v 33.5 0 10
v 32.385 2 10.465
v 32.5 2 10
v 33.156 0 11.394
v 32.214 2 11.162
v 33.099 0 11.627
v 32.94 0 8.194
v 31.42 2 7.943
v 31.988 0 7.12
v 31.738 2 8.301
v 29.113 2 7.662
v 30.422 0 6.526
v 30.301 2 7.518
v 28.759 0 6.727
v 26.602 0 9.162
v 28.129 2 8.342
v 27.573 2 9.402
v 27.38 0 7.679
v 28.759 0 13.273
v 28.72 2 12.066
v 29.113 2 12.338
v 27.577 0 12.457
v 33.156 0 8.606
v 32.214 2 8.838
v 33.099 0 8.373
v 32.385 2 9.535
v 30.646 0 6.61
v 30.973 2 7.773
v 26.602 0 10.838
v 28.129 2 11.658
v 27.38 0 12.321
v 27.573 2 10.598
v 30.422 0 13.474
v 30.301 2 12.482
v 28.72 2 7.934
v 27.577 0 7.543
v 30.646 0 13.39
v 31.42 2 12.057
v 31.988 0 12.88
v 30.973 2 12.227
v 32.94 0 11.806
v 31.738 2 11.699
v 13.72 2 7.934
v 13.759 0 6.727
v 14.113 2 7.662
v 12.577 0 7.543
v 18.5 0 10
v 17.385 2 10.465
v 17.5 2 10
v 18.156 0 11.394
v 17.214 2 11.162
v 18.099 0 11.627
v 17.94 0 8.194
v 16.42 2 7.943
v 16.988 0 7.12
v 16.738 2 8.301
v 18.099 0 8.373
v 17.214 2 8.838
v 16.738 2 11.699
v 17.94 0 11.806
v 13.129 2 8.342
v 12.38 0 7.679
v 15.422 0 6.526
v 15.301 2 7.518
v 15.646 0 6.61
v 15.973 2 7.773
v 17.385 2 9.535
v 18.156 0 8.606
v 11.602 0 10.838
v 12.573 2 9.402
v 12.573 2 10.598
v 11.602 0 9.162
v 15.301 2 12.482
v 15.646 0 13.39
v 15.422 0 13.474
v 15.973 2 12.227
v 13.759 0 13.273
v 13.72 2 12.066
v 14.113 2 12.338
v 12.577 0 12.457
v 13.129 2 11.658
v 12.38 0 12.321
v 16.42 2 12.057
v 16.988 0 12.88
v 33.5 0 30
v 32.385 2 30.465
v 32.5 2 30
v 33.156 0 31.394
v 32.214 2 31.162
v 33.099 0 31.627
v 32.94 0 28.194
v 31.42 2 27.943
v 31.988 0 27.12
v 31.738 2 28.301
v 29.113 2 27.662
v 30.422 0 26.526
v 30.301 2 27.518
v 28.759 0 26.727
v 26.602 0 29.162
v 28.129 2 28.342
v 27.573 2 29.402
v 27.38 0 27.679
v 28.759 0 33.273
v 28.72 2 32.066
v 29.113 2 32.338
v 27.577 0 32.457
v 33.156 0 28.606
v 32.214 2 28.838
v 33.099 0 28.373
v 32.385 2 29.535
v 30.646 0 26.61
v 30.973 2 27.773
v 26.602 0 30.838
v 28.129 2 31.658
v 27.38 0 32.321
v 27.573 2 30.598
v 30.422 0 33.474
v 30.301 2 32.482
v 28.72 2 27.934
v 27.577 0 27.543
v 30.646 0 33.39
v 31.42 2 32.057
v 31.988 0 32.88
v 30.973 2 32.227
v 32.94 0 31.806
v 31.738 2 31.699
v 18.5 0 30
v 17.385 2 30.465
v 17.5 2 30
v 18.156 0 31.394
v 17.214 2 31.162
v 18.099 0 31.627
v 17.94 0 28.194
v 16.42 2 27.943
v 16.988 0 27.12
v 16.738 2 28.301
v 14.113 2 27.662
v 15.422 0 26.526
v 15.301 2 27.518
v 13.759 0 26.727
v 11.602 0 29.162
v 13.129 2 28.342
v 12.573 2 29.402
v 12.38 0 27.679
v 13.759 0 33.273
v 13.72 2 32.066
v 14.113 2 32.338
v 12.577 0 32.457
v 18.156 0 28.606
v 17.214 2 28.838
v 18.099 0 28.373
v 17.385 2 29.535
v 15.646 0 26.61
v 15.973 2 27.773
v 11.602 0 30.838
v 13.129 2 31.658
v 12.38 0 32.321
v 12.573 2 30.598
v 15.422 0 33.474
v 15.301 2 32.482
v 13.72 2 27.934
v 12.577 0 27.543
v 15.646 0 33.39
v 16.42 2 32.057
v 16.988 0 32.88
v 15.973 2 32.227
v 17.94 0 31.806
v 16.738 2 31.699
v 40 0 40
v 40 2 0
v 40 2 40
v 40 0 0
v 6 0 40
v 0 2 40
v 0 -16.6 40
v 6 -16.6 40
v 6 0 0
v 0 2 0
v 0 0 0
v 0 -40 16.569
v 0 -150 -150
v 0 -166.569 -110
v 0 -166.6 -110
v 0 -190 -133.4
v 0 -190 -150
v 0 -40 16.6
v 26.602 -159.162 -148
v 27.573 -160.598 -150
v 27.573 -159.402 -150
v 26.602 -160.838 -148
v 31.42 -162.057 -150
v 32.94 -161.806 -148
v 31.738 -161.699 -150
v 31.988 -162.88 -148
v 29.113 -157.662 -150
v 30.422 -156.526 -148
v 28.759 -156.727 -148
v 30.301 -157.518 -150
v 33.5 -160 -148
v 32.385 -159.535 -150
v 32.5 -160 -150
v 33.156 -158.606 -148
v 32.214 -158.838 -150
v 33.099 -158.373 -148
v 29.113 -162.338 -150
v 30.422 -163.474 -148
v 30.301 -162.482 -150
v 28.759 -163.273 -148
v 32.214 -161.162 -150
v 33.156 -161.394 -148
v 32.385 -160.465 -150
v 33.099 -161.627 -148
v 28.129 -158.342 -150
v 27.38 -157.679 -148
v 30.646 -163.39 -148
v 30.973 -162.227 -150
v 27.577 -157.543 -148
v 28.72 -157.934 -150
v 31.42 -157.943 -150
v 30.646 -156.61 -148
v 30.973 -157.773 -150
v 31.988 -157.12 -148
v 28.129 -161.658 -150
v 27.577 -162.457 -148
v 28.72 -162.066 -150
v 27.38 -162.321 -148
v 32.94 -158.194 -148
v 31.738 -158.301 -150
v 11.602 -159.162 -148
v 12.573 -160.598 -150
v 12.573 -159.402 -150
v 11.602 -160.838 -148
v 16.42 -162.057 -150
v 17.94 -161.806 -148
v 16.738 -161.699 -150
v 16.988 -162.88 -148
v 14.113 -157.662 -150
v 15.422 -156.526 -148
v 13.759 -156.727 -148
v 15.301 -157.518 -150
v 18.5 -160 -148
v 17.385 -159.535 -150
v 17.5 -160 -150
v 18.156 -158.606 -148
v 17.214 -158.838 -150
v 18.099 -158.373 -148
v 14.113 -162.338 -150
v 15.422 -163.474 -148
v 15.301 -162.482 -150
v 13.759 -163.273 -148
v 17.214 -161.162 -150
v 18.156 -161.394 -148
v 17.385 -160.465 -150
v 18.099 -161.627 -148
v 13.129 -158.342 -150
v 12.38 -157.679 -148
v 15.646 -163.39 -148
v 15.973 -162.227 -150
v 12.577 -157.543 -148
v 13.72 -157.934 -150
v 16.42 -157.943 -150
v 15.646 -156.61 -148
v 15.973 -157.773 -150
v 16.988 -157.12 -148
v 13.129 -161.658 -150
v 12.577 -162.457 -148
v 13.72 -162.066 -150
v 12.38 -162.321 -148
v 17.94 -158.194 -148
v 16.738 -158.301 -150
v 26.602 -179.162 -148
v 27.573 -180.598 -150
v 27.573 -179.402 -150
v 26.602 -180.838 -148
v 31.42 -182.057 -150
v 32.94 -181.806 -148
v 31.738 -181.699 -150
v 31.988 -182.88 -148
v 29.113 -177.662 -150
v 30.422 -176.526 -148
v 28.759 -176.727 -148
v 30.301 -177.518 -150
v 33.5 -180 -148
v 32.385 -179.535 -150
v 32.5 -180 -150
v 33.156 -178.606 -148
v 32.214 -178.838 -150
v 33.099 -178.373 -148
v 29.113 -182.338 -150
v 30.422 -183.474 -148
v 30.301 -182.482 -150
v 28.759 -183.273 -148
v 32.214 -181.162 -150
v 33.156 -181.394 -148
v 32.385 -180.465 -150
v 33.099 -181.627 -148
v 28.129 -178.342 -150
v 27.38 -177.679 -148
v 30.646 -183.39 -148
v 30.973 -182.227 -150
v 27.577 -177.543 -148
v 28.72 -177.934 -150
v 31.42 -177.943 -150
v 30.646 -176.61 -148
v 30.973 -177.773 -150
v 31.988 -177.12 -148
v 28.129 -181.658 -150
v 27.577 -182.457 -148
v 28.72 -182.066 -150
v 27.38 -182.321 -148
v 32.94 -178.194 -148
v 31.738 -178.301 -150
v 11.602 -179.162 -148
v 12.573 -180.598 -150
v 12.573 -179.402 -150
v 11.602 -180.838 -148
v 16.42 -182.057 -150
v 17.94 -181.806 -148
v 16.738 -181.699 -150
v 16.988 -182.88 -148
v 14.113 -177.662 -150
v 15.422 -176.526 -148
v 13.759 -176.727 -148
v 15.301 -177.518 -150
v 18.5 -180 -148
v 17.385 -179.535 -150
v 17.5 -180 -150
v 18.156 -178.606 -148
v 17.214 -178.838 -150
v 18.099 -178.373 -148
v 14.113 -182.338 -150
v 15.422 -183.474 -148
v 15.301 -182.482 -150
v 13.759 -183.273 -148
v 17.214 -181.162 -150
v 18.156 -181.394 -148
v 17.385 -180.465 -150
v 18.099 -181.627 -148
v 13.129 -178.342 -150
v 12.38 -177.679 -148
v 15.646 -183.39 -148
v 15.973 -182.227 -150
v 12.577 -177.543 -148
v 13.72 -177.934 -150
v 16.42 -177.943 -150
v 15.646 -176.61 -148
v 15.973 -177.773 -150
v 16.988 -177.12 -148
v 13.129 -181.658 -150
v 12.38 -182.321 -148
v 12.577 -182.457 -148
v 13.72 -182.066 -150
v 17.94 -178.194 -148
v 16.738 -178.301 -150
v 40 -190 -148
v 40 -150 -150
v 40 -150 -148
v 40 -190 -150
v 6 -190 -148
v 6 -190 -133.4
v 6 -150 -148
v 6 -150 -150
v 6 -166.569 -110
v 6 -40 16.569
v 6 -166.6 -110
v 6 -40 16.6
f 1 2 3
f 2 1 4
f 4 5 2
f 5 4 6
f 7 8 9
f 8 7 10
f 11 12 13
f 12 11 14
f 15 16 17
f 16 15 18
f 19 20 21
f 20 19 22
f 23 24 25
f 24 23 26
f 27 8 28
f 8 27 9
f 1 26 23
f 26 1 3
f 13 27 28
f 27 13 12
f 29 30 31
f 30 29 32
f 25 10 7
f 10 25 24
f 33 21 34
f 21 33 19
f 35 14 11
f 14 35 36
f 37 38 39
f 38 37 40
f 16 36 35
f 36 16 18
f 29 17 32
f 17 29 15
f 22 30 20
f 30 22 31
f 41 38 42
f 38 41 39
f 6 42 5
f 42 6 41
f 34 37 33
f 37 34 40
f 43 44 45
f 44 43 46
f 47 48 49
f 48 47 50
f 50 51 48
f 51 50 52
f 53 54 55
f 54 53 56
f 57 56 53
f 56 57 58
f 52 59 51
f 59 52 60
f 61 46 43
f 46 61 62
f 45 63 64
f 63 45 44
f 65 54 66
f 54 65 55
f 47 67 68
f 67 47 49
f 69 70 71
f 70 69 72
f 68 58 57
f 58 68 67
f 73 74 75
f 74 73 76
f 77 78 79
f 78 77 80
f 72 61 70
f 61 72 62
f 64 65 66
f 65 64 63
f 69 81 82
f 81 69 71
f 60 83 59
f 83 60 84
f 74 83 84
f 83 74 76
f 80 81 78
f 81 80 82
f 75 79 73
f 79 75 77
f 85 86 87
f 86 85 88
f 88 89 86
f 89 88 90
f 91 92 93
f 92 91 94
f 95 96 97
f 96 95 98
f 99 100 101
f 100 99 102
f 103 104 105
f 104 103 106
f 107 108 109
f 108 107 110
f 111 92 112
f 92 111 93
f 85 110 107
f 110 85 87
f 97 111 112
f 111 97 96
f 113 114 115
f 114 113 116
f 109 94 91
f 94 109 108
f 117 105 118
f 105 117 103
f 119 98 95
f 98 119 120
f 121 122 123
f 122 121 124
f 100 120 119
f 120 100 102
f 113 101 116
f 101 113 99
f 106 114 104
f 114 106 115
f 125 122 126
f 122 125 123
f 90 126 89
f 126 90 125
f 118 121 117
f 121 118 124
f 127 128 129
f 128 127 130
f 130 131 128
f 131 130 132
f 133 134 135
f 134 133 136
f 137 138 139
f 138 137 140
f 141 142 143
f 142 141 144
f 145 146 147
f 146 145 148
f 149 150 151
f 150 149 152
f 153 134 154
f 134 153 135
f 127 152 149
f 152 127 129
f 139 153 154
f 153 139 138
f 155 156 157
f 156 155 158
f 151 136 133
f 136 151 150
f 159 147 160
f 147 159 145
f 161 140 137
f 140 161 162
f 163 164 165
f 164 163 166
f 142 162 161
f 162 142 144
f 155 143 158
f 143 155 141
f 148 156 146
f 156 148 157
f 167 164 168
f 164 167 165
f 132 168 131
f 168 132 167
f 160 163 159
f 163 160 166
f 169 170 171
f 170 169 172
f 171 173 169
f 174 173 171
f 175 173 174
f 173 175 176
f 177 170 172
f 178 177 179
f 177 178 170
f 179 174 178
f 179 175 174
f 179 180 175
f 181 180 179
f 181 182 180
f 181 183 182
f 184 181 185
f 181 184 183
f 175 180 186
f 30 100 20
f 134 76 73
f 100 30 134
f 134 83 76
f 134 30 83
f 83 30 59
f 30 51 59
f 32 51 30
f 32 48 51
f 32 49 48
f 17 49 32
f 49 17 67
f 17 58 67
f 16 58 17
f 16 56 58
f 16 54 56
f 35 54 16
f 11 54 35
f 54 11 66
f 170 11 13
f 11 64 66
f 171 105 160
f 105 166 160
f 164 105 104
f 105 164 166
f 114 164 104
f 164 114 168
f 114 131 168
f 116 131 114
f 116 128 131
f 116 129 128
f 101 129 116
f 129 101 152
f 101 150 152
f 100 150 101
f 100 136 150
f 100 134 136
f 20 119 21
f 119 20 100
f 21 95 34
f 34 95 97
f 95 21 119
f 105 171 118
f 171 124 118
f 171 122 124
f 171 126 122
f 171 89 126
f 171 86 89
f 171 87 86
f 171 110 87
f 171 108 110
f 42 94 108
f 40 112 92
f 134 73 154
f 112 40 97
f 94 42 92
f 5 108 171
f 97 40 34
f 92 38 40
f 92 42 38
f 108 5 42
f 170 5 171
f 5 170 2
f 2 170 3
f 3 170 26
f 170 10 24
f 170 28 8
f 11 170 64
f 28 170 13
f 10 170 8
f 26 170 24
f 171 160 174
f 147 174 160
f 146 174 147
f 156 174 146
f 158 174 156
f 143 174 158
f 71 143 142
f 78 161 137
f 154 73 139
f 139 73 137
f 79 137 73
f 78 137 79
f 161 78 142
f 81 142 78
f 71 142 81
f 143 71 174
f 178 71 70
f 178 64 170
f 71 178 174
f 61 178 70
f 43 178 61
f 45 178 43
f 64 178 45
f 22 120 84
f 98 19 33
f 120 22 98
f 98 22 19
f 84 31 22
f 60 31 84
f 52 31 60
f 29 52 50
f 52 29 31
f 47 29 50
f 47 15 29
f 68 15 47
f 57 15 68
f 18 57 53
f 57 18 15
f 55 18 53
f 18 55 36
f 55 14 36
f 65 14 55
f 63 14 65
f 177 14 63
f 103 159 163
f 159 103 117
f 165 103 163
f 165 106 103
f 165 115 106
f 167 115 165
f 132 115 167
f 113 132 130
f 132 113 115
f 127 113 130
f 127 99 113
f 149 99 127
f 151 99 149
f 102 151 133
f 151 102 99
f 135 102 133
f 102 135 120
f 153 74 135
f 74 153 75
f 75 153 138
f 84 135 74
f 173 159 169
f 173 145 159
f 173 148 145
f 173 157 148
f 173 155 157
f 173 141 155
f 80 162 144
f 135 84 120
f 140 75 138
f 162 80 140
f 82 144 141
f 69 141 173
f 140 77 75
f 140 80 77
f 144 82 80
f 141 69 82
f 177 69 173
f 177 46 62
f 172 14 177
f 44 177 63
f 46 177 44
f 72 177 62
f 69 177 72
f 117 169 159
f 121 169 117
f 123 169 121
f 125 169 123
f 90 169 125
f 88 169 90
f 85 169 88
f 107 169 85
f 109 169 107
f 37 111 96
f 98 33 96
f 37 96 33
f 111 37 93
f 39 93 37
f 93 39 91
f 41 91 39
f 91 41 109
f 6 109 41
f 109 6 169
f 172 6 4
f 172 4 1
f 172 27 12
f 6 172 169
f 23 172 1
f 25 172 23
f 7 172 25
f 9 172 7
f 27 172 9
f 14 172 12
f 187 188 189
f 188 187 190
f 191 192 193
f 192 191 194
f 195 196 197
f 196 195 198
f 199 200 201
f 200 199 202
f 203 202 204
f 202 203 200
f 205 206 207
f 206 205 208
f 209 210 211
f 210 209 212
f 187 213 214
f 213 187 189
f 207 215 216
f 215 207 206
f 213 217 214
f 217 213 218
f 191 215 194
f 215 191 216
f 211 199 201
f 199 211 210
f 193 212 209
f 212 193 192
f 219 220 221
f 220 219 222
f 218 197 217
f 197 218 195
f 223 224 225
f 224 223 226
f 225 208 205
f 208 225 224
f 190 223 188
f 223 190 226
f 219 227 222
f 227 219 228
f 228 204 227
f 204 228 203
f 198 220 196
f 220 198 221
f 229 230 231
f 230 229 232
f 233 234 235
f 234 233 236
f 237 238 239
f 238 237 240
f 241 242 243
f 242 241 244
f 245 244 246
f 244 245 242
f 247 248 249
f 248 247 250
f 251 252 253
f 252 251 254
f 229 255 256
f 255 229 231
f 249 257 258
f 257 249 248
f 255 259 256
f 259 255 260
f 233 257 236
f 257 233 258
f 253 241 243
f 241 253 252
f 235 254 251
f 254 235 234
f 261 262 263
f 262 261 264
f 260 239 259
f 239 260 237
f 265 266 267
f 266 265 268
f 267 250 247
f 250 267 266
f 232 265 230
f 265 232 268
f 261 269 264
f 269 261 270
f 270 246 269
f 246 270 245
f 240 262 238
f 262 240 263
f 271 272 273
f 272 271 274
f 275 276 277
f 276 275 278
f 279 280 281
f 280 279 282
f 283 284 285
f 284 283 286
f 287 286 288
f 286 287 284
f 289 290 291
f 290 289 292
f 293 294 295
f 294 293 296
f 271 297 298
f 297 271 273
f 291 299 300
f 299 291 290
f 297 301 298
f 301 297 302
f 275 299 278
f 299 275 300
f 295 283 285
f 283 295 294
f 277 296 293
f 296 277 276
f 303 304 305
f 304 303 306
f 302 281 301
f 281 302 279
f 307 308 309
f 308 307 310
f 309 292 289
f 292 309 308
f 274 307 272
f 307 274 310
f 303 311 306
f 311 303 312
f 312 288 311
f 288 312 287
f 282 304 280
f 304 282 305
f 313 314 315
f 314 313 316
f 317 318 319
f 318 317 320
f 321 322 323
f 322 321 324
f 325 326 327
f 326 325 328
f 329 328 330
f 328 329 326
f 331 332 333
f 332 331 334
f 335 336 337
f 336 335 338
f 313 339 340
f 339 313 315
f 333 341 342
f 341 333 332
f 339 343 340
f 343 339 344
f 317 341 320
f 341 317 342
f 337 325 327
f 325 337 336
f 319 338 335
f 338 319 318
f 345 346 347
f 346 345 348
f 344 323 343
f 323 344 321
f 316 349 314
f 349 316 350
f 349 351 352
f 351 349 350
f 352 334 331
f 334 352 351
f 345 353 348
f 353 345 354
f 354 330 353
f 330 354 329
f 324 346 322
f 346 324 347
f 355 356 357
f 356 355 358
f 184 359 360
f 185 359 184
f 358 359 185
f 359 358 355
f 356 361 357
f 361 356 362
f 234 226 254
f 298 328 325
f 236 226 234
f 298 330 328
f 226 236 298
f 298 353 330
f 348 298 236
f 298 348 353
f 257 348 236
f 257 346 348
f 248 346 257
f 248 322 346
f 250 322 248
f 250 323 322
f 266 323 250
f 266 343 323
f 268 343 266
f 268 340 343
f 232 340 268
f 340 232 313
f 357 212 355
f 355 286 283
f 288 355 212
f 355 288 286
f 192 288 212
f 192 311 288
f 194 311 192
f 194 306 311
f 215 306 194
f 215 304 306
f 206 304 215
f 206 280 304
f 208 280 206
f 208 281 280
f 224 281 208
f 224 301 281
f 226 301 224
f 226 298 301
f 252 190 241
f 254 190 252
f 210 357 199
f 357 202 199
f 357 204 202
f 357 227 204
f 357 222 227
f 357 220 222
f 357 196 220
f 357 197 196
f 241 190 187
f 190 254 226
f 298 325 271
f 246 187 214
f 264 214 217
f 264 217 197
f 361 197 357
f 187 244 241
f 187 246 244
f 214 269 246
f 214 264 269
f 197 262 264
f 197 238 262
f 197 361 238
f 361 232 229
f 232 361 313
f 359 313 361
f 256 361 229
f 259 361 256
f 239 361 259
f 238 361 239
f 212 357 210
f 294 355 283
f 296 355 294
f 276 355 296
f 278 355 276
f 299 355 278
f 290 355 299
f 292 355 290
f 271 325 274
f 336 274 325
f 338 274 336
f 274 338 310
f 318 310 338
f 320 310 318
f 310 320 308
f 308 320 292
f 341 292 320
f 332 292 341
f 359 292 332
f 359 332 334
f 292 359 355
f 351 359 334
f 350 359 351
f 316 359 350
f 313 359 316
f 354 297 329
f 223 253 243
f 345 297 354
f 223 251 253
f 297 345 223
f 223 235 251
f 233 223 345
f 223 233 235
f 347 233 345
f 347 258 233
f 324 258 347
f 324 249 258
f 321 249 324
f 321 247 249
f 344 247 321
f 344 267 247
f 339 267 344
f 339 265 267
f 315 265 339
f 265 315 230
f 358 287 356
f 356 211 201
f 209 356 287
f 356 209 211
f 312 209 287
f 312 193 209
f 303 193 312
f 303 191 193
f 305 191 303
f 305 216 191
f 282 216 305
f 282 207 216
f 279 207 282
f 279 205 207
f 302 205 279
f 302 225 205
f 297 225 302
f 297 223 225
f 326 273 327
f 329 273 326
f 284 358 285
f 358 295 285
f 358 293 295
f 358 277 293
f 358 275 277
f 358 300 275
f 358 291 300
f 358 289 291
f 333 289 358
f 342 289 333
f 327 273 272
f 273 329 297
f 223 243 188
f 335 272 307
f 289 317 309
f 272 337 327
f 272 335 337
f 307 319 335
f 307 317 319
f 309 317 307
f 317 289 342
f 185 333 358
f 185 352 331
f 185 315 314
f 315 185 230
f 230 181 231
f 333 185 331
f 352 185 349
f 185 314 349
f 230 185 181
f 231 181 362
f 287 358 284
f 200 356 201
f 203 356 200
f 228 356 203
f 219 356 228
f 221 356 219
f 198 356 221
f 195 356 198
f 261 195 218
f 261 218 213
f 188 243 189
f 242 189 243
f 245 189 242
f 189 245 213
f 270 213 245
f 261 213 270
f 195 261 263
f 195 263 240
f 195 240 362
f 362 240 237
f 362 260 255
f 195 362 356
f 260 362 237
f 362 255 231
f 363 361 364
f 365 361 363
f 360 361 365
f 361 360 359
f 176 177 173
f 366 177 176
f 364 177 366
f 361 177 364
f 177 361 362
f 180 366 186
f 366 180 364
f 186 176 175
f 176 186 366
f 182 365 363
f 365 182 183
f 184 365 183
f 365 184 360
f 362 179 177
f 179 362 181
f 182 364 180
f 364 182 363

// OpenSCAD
/* [Global */
span=150;
spanThickness=6;
plateWidth=40;
plateHeight=40;
holeInterval=20;

/* [Hidden] */

plate(90,3,plateWidth,plateHeight,holeInterval,spanThickness);
translate([0,-span,-span]) rotate([90,0,0]) plate(-90,-1,plateWidth,plateHeight,holeInterval,spanThickness);
brace(span,spanThickness,plateHeight);

module brace(span,spanThickness,plateHeight) {
    myLeng=sqrt((span*span)+(span*span));
    translate([0,-span,-span]) rotate([45,0,0]) cube([spanThickness,myLeng,plateHeight]);
    difference(){
        translate([0,-plateHeight,0]) cube([spanThickness,plateHeight,plateHeight]);
        translate([-1,-plateHeight,(plateHeight/4)+(plateHeight*0.165)]) rotate([45,0,0]) cube([spanThickness+2,plateHeight,plateHeight]);
    }
    difference(){
    translate([0,-(span+plateHeight),-(span)]) cube([spanThickness,plateHeight,plateHeight]);
    translate([-1,-(span+plateHeight),-(span-((plateHeight/4)+(plateHeight*0.165)))]) rotate([45,0,0]) cube([spanThickness+2,plateHeight,plateHeight]);
    }
}
module plate(xRot,yTrans,plateWidth,plateHeight,holeInterval,spanThickness) {
    difference() {
        cube([plateWidth,2,plateHeight]);
        for (a =[0:(plateHeight/20)])
        {echo(a);
        if (a>0) {
        translate([30,yTrans,a*holeInterval-10]) rotate([xRot,0,0]) cylinder(h=4,d1=4,d2=8);
        translate([holeInterval-5,yTrans,a*holeInterval-10]) rotate([xRot,0,0]) cylinder(h=4,d1=4,d2=8);
        };
        };
    }
}
